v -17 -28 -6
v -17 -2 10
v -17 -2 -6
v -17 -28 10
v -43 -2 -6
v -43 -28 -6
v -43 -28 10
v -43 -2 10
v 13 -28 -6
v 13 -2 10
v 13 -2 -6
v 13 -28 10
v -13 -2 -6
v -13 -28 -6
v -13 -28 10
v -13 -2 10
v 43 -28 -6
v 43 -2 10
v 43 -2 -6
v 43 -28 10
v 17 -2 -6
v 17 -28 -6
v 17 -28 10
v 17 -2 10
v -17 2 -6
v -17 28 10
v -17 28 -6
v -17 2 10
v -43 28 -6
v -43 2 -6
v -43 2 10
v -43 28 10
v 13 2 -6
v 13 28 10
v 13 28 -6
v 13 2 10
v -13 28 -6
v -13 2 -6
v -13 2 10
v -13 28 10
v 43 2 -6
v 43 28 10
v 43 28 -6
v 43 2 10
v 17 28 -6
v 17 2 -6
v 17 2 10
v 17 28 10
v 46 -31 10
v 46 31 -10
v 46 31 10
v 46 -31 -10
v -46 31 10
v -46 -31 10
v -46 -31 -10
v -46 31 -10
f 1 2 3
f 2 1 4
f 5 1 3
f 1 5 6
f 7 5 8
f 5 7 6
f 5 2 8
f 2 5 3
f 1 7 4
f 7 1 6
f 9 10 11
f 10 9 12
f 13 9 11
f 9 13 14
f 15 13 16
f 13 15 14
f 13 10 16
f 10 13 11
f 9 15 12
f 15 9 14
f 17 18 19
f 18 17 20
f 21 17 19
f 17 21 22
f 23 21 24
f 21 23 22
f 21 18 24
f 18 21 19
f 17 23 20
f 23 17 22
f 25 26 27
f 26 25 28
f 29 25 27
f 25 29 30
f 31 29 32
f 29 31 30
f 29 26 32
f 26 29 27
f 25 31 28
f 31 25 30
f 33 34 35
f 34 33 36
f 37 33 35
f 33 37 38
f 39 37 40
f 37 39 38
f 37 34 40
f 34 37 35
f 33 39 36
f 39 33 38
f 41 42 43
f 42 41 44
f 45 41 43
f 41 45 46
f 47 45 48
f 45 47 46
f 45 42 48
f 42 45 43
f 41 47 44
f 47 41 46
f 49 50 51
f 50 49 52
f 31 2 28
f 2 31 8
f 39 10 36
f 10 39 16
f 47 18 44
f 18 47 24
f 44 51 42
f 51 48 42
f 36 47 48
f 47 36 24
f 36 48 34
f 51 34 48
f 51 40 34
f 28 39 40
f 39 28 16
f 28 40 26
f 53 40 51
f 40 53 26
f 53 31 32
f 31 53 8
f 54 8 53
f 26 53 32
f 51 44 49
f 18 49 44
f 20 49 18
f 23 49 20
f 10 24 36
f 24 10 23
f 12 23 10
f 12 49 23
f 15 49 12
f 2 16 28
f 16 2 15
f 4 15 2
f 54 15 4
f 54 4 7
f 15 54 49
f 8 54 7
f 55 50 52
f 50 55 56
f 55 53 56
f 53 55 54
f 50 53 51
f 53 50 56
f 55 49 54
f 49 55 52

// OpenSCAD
$fn = 32;

// ----------------------------------------------------------------------
// Pocket plate 92 x 62 x 20
// 2 x 3 pockets 26 mm square, 16 mm deep
// ----------------------------------------------------------------------

// --- parameters (mm) ---
thickness = 20;  // plate thickness
floor_t = 4;     // material left under each pocket
pocket = 26;     // pocket side length
pitch_x = 30;    // pocket pitch along X
pitch_y = 30;    // pocket pitch along Y
cols = 3;        // pockets per row
rows = 2;        // rows of pockets

// --- derived feature positions (mm) ---
depth = thickness - floor_t;        // = 16   pocket depth, down to the floor
span_x = (cols - 1) * pitch_x;      // = 60   distance between outer pockets
span_y = (rows - 1) * pitch_y;      // = 30   distance between outer pocket rows
origin_x = -span_x / 2;             // = -30   X of the first pocket
origin_y = -span_y / 2;             // = -15   Y of the first pocket
plate = [span_x + pocket + 6, span_y + pocket + 6, thickness];  // = [92, 62, 20]   overall size: pockets plus 3 mm of wall on each side
feature_centers = [
  [origin_x + 0 * pitch_x, origin_y + 0 * pitch_y],
  [origin_x + 1 * pitch_x, origin_y + 0 * pitch_y],
  [origin_x + 2 * pitch_x, origin_y + 0 * pitch_y],
  [origin_x + 0 * pitch_x, origin_y + 1 * pitch_y],
  [origin_x + 1 * pitch_x, origin_y + 1 * pitch_y],
  [origin_x + 2 * pitch_x, origin_y + 1 * pitch_y]
];   // pocket centres, used verbatim by the cutter loop

// plate outline, then one pocket per centre in feature_centers
difference() {
  cube(plate, center = true);
  for (centre = feature_centers)
    translate([centre[0] - pocket / 2, centre[1] - pocket / 2, plate[2] / 2 - depth])
      cube([pocket, pocket, depth + 1]);  // centred on the declared pocket centre
}
